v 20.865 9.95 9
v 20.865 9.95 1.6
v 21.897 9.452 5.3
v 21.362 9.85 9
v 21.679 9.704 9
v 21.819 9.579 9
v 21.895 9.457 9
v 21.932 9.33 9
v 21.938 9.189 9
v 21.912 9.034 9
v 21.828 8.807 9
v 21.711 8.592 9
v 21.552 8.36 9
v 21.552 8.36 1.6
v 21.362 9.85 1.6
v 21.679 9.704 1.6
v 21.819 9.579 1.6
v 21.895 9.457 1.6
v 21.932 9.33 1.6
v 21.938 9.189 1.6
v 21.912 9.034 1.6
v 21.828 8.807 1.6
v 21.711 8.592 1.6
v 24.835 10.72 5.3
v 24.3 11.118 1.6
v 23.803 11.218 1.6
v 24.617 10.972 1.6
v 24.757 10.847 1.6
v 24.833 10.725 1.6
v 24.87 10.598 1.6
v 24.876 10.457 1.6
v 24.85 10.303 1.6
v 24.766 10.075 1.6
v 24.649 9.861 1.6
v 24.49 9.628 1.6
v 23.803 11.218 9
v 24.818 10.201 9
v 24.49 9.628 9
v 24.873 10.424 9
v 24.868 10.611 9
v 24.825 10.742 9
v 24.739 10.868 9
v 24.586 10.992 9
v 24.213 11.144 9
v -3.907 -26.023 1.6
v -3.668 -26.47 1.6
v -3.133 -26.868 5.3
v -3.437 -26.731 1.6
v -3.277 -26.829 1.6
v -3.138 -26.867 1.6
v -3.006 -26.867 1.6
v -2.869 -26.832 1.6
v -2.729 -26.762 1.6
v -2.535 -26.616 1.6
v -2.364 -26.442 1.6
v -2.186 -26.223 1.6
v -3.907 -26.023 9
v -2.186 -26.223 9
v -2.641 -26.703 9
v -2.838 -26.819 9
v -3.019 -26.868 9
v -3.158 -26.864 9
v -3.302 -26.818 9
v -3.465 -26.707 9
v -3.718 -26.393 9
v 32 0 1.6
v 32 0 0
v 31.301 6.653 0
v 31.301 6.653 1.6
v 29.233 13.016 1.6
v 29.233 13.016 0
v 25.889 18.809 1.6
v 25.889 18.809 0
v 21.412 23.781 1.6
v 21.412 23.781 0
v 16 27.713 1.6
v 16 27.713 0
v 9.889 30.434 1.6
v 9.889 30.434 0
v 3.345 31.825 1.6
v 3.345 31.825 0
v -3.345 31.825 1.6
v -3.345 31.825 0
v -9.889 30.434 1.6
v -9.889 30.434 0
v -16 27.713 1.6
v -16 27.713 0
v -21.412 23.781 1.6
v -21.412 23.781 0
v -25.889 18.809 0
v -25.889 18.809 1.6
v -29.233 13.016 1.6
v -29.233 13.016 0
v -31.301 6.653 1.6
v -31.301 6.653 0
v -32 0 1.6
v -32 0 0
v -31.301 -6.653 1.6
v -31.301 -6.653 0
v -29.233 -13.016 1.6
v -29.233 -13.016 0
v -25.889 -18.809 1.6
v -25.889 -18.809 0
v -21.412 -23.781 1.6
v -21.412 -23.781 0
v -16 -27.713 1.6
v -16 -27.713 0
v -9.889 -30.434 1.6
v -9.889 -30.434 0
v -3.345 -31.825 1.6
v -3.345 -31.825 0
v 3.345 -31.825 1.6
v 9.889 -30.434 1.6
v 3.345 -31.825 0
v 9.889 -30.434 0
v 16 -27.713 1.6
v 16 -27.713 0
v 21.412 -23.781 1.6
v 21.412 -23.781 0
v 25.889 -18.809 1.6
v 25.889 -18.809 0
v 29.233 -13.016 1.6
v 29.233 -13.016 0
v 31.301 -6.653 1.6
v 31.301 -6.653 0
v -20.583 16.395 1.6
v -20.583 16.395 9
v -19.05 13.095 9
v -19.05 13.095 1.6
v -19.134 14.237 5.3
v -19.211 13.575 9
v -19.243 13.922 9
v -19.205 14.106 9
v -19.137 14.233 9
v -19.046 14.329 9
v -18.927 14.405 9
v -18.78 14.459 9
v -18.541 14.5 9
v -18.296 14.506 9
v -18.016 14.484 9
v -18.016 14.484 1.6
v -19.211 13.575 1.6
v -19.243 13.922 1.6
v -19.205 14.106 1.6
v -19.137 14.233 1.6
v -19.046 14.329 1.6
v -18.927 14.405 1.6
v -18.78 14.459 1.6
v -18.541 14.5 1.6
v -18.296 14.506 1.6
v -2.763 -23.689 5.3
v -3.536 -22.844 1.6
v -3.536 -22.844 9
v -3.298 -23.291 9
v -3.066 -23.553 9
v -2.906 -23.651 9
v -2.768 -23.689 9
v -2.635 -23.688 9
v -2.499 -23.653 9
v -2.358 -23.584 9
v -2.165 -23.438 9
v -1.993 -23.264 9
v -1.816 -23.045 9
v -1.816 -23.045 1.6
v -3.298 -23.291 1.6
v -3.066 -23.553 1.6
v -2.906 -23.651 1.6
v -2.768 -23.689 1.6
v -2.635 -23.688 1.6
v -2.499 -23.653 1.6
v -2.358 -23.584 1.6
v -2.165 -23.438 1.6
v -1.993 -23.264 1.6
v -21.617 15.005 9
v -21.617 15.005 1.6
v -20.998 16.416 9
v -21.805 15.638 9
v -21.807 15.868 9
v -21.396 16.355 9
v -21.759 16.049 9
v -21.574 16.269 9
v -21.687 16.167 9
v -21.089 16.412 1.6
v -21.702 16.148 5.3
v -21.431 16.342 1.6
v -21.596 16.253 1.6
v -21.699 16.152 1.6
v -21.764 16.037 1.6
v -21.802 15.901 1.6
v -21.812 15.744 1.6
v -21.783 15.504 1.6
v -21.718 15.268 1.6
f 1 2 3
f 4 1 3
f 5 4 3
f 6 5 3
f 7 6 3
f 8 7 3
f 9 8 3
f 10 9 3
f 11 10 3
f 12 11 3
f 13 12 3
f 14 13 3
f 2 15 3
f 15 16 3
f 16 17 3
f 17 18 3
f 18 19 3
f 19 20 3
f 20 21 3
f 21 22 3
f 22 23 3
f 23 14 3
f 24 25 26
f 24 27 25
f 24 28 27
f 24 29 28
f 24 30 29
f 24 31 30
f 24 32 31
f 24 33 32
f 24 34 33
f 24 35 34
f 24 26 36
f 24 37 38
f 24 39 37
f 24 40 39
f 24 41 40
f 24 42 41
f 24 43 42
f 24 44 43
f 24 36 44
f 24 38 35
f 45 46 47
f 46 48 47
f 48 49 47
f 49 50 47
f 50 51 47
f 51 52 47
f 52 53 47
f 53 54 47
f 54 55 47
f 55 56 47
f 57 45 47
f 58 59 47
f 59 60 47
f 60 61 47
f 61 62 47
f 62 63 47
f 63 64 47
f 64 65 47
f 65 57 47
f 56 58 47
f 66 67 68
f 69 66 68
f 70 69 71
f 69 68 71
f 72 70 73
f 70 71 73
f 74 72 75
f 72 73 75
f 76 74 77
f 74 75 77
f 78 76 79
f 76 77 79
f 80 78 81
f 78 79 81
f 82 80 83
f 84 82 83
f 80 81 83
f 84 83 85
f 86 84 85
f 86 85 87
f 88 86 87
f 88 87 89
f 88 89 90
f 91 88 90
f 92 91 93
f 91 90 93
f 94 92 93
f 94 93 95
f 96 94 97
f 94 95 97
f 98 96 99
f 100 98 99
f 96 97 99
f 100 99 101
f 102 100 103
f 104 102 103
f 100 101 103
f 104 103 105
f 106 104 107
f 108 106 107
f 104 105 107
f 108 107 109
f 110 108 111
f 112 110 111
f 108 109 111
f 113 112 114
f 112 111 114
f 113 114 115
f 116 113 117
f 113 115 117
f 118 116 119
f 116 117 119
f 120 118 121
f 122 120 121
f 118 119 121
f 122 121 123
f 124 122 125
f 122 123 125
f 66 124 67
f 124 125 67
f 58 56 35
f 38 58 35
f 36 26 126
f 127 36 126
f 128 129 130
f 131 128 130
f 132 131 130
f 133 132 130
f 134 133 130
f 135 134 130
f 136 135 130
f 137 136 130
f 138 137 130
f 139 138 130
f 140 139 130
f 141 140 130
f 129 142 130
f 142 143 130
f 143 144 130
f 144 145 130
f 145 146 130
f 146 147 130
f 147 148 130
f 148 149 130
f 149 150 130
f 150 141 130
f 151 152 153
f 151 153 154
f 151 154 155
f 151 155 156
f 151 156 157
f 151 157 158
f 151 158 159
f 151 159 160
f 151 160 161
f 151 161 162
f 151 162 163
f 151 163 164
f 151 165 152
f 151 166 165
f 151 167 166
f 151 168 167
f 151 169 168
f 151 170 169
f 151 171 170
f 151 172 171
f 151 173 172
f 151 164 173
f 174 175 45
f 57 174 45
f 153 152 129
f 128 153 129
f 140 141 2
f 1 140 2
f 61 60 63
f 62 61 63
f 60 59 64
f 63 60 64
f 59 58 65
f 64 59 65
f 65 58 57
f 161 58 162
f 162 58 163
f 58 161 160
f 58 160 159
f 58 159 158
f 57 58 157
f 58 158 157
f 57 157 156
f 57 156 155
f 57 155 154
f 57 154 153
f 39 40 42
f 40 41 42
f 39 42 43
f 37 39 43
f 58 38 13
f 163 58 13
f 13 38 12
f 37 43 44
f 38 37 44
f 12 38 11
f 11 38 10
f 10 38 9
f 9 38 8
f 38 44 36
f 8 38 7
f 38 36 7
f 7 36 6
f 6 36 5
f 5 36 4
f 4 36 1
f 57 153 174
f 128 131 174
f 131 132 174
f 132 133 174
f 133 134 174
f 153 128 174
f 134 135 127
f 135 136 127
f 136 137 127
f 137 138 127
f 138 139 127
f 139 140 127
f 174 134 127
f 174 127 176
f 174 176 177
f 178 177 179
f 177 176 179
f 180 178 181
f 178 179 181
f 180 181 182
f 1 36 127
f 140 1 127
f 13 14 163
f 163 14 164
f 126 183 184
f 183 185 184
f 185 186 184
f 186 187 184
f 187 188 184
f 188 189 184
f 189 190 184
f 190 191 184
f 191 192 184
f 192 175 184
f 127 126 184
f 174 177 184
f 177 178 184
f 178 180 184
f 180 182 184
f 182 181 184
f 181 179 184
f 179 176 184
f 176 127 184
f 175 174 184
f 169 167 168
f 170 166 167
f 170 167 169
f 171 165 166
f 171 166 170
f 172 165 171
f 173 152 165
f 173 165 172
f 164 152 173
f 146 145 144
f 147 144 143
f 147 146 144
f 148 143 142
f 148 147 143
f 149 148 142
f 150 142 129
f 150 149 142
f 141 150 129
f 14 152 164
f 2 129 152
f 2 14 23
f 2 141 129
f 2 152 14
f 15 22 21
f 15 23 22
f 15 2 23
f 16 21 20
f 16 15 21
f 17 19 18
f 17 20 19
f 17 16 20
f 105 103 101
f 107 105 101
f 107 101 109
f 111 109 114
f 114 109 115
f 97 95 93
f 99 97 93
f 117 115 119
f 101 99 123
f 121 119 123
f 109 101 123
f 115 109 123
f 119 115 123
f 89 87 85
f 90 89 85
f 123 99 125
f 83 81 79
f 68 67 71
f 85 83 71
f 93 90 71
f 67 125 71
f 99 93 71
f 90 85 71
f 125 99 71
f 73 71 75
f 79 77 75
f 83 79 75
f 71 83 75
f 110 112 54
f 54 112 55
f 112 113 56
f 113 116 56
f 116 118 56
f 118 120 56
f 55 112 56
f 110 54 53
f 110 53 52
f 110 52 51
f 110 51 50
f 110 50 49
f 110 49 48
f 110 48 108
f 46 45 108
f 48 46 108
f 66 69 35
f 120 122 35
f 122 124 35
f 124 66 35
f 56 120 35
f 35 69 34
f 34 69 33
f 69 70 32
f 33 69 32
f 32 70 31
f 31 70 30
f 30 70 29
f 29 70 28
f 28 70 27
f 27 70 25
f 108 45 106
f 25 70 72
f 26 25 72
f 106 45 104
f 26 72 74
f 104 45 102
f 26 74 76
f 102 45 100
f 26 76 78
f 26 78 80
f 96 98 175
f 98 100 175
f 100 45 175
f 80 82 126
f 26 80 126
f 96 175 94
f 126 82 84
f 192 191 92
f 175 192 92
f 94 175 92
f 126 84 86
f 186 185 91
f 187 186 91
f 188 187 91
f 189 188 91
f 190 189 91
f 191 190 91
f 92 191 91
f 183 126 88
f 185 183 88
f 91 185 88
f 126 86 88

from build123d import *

# Parameters (mm, degrees)
F0_R        = 32
F1_DEPTH    = 1.6
F2_DEPTH    = 1.6
F3_DEPTH    = 9
F4_T1_DEPTH = 7.4
F4_T3_DEPTH = 11.7301270189


# Not quite as in the source:
# - a fillet or chamfer that OpenCascade refuses, or shapes differently, is made with other operations: its cross-section is extruded or revolved along the edge and cut away or added


with BuildPart() as f1:
    # F0 (on Top) → F1 (new body)
    with BuildSketch(Plane.XY):
        Circle(F0_R)
        Polygon((-3.2203362492, -27.6128490823), (-22.3032606516, 16.5953175417), (25.5235969007, 11.0175315406), align=None, mode=Mode.SUBTRACT)
        Polygon((25.5235969007, 11.0175315406), (-22.3032606516, 16.5953175417), (-3.2203362492, -27.6128490823), align=None)
        Polygon((-2.8496500622, -24.434391634), (-19.7359788499, 14.6850651628), (22.5856289122, 9.7493264712), align=None, mode=Mode.SUBTRACT)
    extrude(amount=F1_DEPTH)

    # F0 (on Top) → F2 (join)
    with BuildSketch(Plane.XY):
        Polygon((22.5856289122, 9.7493264712), (-19.7359788499, 14.6850651628), (-2.8496500622, -24.434391634), align=None)
    extrude(amount=F2_DEPTH)

    # F0 (on Top) → F3 (join)
    with BuildSketch(Plane.XY):
        Polygon((25.5235969007, 11.0175315406), (-22.3032606516, 16.5953175417), (-3.2203362492, -27.6128490823), align=None)
        Polygon((-2.8496500622, -24.434391634), (-19.7359788499, 14.6850651628), (22.5856289122, 9.7493264712), align=None, mode=Mode.SUBTRACT)
    extrude(amount=F3_DEPTH)

    # F4: fillet of radius 1 on 6 edges, made by hand

    # F4_s2 → F4_t1 (join)
    with BuildSketch(Plane.XY.offset(1.6)):
        with BuildLine():
            add(Edge.make_bspline(
                [(-3.5360861918, -22.844169813), (-2.8496500622, -24.434391634), (-1.8156956324, -23.0448095972)],
                knots=[0, 0, 0, 1, 1, 1], degree=2, weights=[1, 1, 1]))
            Line((-1.8156956324, -23.0448095972), (-2.8496500622, -24.434391634))
            Line((-2.8496500622, -24.434391634), (-3.5360861918, -22.844169813))
        make_face()
        with BuildLine():
            add(Edge.make_bspline(
                [(20.8652383527, 9.9499662554), (22.5856289122, 9.7493264712), (21.5516744823, 8.3597444344)],
                knots=[0, 0, 0, 1, 1, 1], degree=2, weights=[1, 1, 1]))
            Line((21.5516744823, 8.3597444344), (22.5856289122, 9.7493264712))
            Line((22.5856289122, 9.7493264712), (20.8652383527, 9.9499662554))
        make_face()
        with BuildLine():
            add(Edge.make_bspline(
                [(-19.0495427204, 13.0948433418), (-19.7359788499, 14.6850651628), (-18.0155882905, 14.4844253786)],
                knots=[0, 0, 0, 1, 1, 1], degree=2, weights=[1, 1, 1]))
            Line((-18.0155882905, 14.4844253786), (-19.7359788499, 14.6850651628))
            Line((-19.7359788499, 14.6850651628), (-19.0495427204, 13.0948433418))
        make_face()
    extrude(amount=F4_T1_DEPTH)

    # F4_s4 → F4_t3 (cut)
    with BuildSketch(Plane.XY.offset(1.6)):
        with BuildLine():
            add(Edge.make_bspline(
                [(-3.9067723788, -26.0226272613), (-3.2203362492, -27.6128490823), (-2.1863818193, -26.2232670455)],
                knots=[0, 0, 0, 1, 1, 1], degree=2, weights=[1, 1, 1]))
            Line((-2.1863818193, -26.2232670455), (-3.2203362492, -27.6128490823))
            Line((-3.2203362492, -27.6128490823), (-3.9067723788, -26.0226272613))
        make_face()
        with BuildLine():
            add(Edge.make_bspline(
                [(23.8032063413, 11.2181713248), (25.5235969007, 11.0175315406), (24.4896424709, 9.6279495038)],
                knots=[0, 0, 0, 1, 1, 1], degree=2, weights=[1, 1, 1]))
            Line((24.4896424709, 9.6279495038), (25.5235969007, 11.0175315406))
            Line((25.5235969007, 11.0175315406), (23.8032063413, 11.2181713248))
        make_face()
        with BuildLine():
            add(Edge.make_bspline(
                [(-20.5828700921, 16.3946777575), (-22.3032606516, 16.5953175417), (-21.616824522, 15.0050957207)],
                knots=[0, 0, 0, 1, 1, 1], degree=2, weights=[1, 1, 1]))
            Line((-21.616824522, 15.0050957207), (-22.3032606516, 16.5953175417))
            Line((-22.3032606516, 16.5953175417), (-20.5828700921, 16.3946777575))
        make_face()
    extrude(amount=F4_T3_DEPTH, mode=Mode.SUBTRACT)


solid = f1.part
